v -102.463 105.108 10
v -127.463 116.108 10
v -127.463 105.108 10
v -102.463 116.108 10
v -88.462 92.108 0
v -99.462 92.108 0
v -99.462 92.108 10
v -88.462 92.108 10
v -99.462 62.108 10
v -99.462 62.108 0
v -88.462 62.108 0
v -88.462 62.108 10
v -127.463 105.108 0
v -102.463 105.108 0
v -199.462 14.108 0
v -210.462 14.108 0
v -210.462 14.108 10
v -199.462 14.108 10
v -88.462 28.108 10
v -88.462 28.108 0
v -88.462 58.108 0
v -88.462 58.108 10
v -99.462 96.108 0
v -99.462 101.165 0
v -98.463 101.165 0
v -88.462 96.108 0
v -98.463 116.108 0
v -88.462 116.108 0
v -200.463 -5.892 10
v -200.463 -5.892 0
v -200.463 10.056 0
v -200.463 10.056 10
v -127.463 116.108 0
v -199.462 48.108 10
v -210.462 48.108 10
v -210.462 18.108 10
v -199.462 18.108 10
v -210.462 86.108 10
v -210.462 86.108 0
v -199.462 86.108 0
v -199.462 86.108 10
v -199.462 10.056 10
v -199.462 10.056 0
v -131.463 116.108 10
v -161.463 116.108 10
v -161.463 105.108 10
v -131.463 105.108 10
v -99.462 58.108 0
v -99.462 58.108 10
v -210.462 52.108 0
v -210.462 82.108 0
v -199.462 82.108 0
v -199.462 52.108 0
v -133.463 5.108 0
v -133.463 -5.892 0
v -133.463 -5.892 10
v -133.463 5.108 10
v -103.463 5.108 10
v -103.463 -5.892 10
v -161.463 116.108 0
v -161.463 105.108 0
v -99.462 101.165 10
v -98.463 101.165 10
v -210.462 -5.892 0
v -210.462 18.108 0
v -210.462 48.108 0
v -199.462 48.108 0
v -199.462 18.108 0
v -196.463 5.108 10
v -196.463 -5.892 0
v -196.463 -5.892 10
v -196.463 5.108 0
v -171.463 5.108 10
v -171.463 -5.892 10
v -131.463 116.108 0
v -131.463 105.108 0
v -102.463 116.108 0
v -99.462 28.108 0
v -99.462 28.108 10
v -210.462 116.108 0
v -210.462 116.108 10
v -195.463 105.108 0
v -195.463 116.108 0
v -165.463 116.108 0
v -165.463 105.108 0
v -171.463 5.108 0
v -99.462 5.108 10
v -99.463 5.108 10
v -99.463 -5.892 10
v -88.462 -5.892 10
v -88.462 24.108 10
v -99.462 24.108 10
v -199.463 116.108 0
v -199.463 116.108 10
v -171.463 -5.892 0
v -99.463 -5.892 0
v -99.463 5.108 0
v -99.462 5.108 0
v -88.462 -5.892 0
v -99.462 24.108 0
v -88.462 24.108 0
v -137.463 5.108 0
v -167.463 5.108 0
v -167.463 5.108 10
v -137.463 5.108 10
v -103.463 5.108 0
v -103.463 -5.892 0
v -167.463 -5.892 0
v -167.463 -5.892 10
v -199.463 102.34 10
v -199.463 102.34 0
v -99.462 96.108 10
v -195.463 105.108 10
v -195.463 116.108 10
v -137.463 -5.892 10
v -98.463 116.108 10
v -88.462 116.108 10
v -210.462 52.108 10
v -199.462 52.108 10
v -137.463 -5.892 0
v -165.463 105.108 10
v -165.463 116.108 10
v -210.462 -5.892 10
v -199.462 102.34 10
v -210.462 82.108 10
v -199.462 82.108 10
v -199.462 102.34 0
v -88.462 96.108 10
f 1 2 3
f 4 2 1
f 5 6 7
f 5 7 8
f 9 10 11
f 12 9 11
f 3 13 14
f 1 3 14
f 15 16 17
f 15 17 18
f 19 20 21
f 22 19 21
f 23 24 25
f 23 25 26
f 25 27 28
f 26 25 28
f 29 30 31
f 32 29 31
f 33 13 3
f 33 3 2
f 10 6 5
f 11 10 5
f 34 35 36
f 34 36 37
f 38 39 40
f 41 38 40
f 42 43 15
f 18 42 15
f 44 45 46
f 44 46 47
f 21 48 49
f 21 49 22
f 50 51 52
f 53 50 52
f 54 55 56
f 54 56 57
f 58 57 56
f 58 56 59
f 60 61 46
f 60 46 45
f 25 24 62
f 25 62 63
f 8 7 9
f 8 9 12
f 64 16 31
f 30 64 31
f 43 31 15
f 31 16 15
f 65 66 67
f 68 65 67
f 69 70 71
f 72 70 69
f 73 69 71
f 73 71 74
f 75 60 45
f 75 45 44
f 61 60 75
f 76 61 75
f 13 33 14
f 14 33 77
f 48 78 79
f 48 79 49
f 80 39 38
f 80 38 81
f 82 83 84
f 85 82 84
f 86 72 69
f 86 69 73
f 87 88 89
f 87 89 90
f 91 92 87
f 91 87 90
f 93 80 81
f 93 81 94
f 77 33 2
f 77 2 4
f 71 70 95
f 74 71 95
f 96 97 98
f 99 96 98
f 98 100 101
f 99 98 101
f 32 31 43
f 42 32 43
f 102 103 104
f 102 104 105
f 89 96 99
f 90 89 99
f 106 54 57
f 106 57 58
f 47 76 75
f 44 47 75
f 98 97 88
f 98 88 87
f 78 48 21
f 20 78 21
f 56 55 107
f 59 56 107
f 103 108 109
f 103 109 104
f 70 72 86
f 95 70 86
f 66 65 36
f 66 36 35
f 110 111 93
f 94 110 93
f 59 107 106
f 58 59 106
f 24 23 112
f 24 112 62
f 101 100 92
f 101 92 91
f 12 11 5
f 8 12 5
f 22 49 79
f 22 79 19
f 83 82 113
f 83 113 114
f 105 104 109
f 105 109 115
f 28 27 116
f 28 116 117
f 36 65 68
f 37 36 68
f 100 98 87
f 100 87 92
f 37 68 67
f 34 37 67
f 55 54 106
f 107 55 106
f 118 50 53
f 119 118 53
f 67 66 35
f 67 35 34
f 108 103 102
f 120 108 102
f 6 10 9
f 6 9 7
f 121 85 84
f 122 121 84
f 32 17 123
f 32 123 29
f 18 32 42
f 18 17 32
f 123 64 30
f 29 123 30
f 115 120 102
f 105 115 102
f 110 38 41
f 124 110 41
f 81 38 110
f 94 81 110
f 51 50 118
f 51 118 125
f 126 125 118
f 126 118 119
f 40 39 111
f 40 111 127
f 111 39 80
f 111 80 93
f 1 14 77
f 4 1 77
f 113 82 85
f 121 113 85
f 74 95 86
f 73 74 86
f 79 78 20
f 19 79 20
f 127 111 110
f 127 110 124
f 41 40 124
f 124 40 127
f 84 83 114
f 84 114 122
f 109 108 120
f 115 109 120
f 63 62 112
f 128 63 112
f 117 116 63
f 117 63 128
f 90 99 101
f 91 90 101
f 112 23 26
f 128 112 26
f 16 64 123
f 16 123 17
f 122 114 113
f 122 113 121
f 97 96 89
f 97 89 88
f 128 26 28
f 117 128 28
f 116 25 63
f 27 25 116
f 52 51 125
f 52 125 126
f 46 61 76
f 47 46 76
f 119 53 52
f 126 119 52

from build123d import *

# Parameters (mm, degrees)
SKETCH6_W           = 122
SKETCH6_H           = 122
SKETCH6_W_2         = 100
SKETCH6_H_2         = 100
BOSS_EXTRUDE3_DEPTH = 10
SKETCH7_W           = 4
SKETCH7_H           = 13.767715449
CUT_EXTRUDE2_DEPTH  = 10
SKETCH8_W           = 4
SKETCH8_H           = 15
CUT_EXTRUDE3_DEPTH  = 10
SKETCH9_W           = 4
SKETCH9_H           = 18
CUT_EXTRUDE4_DEPTH  = 10
SKETCH10_W          = 4
SKETCH10_H          = 16.778786697
CUT_EXTRUDE5_DEPTH  = 10
SKETCH11_W          = 4
SKETCH11_H          = 17.459048521
CUT_EXTRUDE7_DEPTH  = 10
SKETCH12_W          = 4
SKETCH12_H          = 21.812422706
CUT_EXTRUDE9_DEPTH  = 10
SKETCH13_W          = 4
SKETCH13_H          = 17.574592677
CUT_EXTRUDE10_DEPTH = 10
SKETCH14_W          = 4
SKETCH14_H          = 21.309059105
CUT_EXTRUDE11_DEPTH = 10
SKETCH15_W          = 17.282150298
SKETCH15_H          = 4
CUT_EXTRUDE12_DEPTH = 10
SKETCH16_W          = 20.302331903
SKETCH16_H          = 4
CUT_EXTRUDE13_DEPTH = 10
SKETCH18_W          = 17.114362431
SKETCH18_H          = 4
CUT_EXTRUDE15_DEPTH = 10
SKETCH19_W          = 18.2888775
SKETCH19_H          = 4
CUT_EXTRUDE16_DEPTH = 10
SKETCH20_W          = 17.953301765
SKETCH20_H          = 4
CUT_EXTRUDE17_DEPTH = 10
SKETCH21_W          = 23.154725642
SKETCH21_H          = 4
CUT_EXTRUDE19_DEPTH = 10


with BuildPart() as part:
    # Sketch6 → Boss-Extrude3 (new body)
    with BuildSketch(Plane.XY):
        with Locations((-149.462365591, 55.107526882)):
            Rectangle(SKETCH6_W, SKETCH6_H)
        with Locations((-149.462365591, 55.107526882)):
            Rectangle(SKETCH6_W_2, SKETCH6_H_2, mode=Mode.SUBTRACT)
    extrude(amount=BOSS_EXTRUDE3_DEPTH)

    # Sketch7 → Cut-Extrude2 (cut)
    with BuildSketch(Plane.XY):
        with Locations((-197.463365591, 109.223669158)):
            Rectangle(SKETCH7_W, SKETCH7_H)
    extrude(amount=CUT_EXTRUDE2_DEPTH, mode=Mode.SUBTRACT)

    # Sketch8 → Cut-Extrude3 (cut)
    with BuildSketch(Plane.XY):
        with Locations((-163.463365591, 110.846538635)):
            Rectangle(SKETCH8_W, SKETCH8_H)
    extrude(amount=CUT_EXTRUDE3_DEPTH, mode=Mode.SUBTRACT)


with BuildPart() as cut_extrude3_piece_1:
    # of the separate pieces the step leaves, piece 1, a body of its own (cut_extrude3_pieces)
    add(part.part.solids().sort_by_distance((-210.462365591, 116.107526882, 0))[0])

    # Sketch9 → Cut-Extrude4 (cut)
    with BuildSketch(Plane.XY):
        with Locations((-129.463365591, 107.107526882)):
            Rectangle(SKETCH9_W, SKETCH9_H)
    extrude(amount=CUT_EXTRUDE4_DEPTH, mode=Mode.SUBTRACT)


with BuildPart() as cut_extrude3_piece_2:
    # of the separate pieces the step leaves, piece 2, a body of its own (cut_extrude3_pieces)
    add(part.part.solids().sort_by_distance((-195.463365591, 116.107526882, 0))[0])


with BuildPart() as cut_extrude4_piece_1:
    # of the separate pieces the step leaves, piece 1, a body of its own (cut_extrude4_pieces)
    add(cut_extrude3_piece_1.part.solids().sort_by_distance((-210.462365591, 116.107526882, 0))[0])

    # Sketch10 → Cut-Extrude5 (cut)
    with BuildSketch(Plane.XY):
        with Locations((-100.463365591, 109.554689714)):
            Rectangle(SKETCH10_W, SKETCH10_H)
    extrude(amount=CUT_EXTRUDE5_DEPTH, mode=Mode.SUBTRACT)


with BuildPart() as cut_extrude4_piece_2:
    # of the separate pieces the step leaves, piece 2, a body of its own (cut_extrude4_pieces)
    add(cut_extrude3_piece_1.part.solids().sort_by_distance((-161.463365591, 116.107526882, 0))[0])


with BuildPart() as cut_extrude5_piece_1:
    # of the separate pieces the step leaves, piece 1, a body of its own (cut_extrude5_pieces)
    add(cut_extrude4_piece_1.part.solids().sort_by_distance((-210.462365591, 116.107526882, 0))[0])

    # Sketch11 → Cut-Extrude7 (cut)
    with BuildSketch(Plane.XY):
        with Locations((-101.463365591, 2.837051142)):
            Rectangle(SKETCH11_W, SKETCH11_H)
    extrude(amount=CUT_EXTRUDE7_DEPTH, mode=Mode.SUBTRACT)


with BuildPart() as cut_extrude5_piece_2:
    # of the separate pieces the step leaves, piece 2, a body of its own (cut_extrude5_pieces)
    add(cut_extrude4_piece_1.part.solids().sort_by_distance((-127.463365591, 116.107526882, 0))[0])


with BuildPart() as cut_extrude7_piece_1:
    # of the separate pieces the step leaves, piece 1, a body of its own (cut_extrude7_pieces)
    add(cut_extrude5_piece_1.part.solids().sort_by_distance((-210.462365591, 116.107526882, 0))[0])

    # Sketch12 → Cut-Extrude9 (cut)
    with BuildSketch(Plane.XY):
        with Locations((-135.463365591, 0.492576183)):
            Rectangle(SKETCH12_W, SKETCH12_H)
    extrude(amount=CUT_EXTRUDE9_DEPTH, mode=Mode.SUBTRACT)


with BuildPart() as cut_extrude7_piece_2:
    # of the separate pieces the step leaves, piece 2, a body of its own (cut_extrude7_pieces)
    add(cut_extrude5_piece_1.part.solids().sort_by_distance((-98.463365591, 116.107526882, 0))[0])

    # Sketch19 → Cut-Extrude16 (cut)
    with BuildSketch(Plane.XY):
        with Locations((-92.619670477, 26.107526882)):
            Rectangle(SKETCH19_W, SKETCH19_H)
    extrude(amount=CUT_EXTRUDE16_DEPTH, mode=Mode.SUBTRACT)


with BuildPart() as cut_extrude9_piece_1:
    # of the separate pieces the step leaves, piece 1, a body of its own (cut_extrude9_pieces)
    add(cut_extrude7_piece_1.part.solids().sort_by_distance((-210.462365591, 116.107526882, 0))[0])

    # Sketch13 → Cut-Extrude10 (cut)
    with BuildSketch(Plane.XY):
        with Locations((-169.463365591, 0.297173693)):
            Rectangle(SKETCH13_W, SKETCH13_H)
    extrude(amount=CUT_EXTRUDE10_DEPTH, mode=Mode.SUBTRACT)


with BuildPart() as cut_extrude9_piece_2:
    # of the separate pieces the step leaves, piece 2, a body of its own (cut_extrude9_pieces)
    add(cut_extrude7_piece_1.part.solids().sort_by_distance((-103.463365591, -5.892473118, 0))[0])


with BuildPart() as cut_extrude10_piece_1:
    # of the separate pieces the step leaves, piece 1, a body of its own (cut_extrude10_pieces)
    add(cut_extrude9_piece_1.part.solids().sort_by_distance((-210.462365591, 116.107526882, 0))[0])

    # Sketch14 → Cut-Extrude11 (cut)
    with BuildSketch(Plane.XY):
        with Locations((-198.463365591, -0.598044951)):
            Rectangle(SKETCH14_W, SKETCH14_H)
    extrude(amount=CUT_EXTRUDE11_DEPTH, mode=Mode.SUBTRACT)


with BuildPart() as cut_extrude10_piece_2:
    # of the separate pieces the step leaves, piece 2, a body of its own (cut_extrude10_pieces)
    add(cut_extrude9_piece_1.part.solids().sort_by_distance((-137.463365591, -5.892473118, 0))[0])


with BuildPart() as cut_extrude11_piece_1:
    # of the separate pieces the step leaves, piece 1, a body of its own (cut_extrude11_pieces)
    add(cut_extrude10_piece_1.part.solids().sort_by_distance((-210.462365591, 116.107526882, 0))[0])

    # Sketch15 → Cut-Extrude12 (cut)
    with BuildSketch(Plane.XY):
        with Locations((-203.909528423, 84.107526882)):
            Rectangle(SKETCH15_W, SKETCH15_H)
    extrude(amount=CUT_EXTRUDE12_DEPTH, mode=Mode.SUBTRACT)


with BuildPart() as cut_extrude11_piece_2:
    # of the separate pieces the step leaves, piece 2, a body of its own (cut_extrude11_pieces)
    add(cut_extrude10_piece_1.part.solids().sort_by_distance((-171.463365591, -5.892473118, 0))[0])


with BuildPart() as cut_extrude12_piece_1:
    # of the separate pieces the step leaves, piece 1, a body of its own (cut_extrude12_pieces)
    add(cut_extrude11_piece_1.part.solids().sort_by_distance((-200.463365591, -5.892473118, 0))[0])

    # Sketch16 → Cut-Extrude13 (cut)
    with BuildSketch(Plane.XY):
        with Locations((-203.406164821, 50.107526882)):
            Rectangle(SKETCH16_W, SKETCH16_H)
    extrude(amount=CUT_EXTRUDE13_DEPTH, mode=Mode.SUBTRACT)


with BuildPart() as cut_extrude12_piece_2:
    # of the separate pieces the step leaves, piece 2, a body of its own (cut_extrude12_pieces)
    add(cut_extrude11_piece_1.part.solids().sort_by_distance((-210.462365591, 116.107526882, 0))[0])


with BuildPart() as cut_extrude13_piece_1:
    # of the separate pieces the step leaves, piece 1, a body of its own (cut_extrude13_pieces)
    add(cut_extrude12_piece_1.part.solids().sort_by_distance((-200.463365591, -5.892473118, 0))[0])

    # Sketch18 → Cut-Extrude15 (cut)
    with BuildSketch(Plane.XY):
        with Locations((-204.161210224, 16.107526882)):
            Rectangle(SKETCH18_W, SKETCH18_H)
    extrude(amount=CUT_EXTRUDE15_DEPTH, mode=Mode.SUBTRACT)


with BuildPart() as cut_extrude13_piece_2:
    # of the separate pieces the step leaves, piece 2, a body of its own (cut_extrude13_pieces)
    add(cut_extrude12_piece_1.part.solids().sort_by_distance((-210.462365591, 52.107526882, 0))[0])


with BuildPart() as cut_extrude15_piece_1:
    # of the separate pieces the step leaves, piece 1, a body of its own (cut_extrude15_pieces)
    add(cut_extrude13_piece_1.part.solids().sort_by_distance((-210.462365591, 18.107526882, 0))[0])


with BuildPart() as cut_extrude15_piece_2:
    # of the separate pieces the step leaves, piece 2, a body of its own (cut_extrude15_pieces)
    add(cut_extrude13_piece_1.part.solids().sort_by_distance((-200.463365591, -5.892473118, 0))[0])


with BuildPart() as cut_extrude16_piece_1:
    # of the separate pieces the step leaves, piece 1, a body of its own (cut_extrude16_pieces)
    add(cut_extrude7_piece_2.part.solids().sort_by_distance((-98.463365591, 116.107526882, 0))[0])

    # Sketch20 → Cut-Extrude17 (cut)
    with BuildSketch(Plane.XY):
        with Locations((-92.83396049, 60.107526882)):
            Rectangle(SKETCH20_W, SKETCH20_H)
    extrude(amount=CUT_EXTRUDE17_DEPTH, mode=Mode.SUBTRACT)


with BuildPart() as cut_extrude16_piece_2:
    # of the separate pieces the step leaves, piece 2, a body of its own (cut_extrude16_pieces)
    add(cut_extrude7_piece_2.part.solids().sort_by_distance((-88.462365591, 24.107526882, 0))[0])


with BuildPart() as cut_extrude17_piece_1:
    # of the separate pieces the step leaves, piece 1, a body of its own (cut_extrude17_pieces)
    add(cut_extrude16_piece_1.part.solids().sort_by_distance((-98.463365591, 116.107526882, 0))[0])

    # Sketch21 → Cut-Extrude19 (cut)
    with BuildSketch(Plane.XY):
        with Locations((-93.08564229, 94.107526882)):
            Rectangle(SKETCH21_W, SKETCH21_H)
    extrude(amount=CUT_EXTRUDE19_DEPTH, mode=Mode.SUBTRACT)


with BuildPart() as cut_extrude17_piece_2:
    # of the separate pieces the step leaves, piece 2, a body of its own (cut_extrude17_pieces)
    add(cut_extrude16_piece_1.part.solids().sort_by_distance((-88.462365591, 58.107526882, 0))[0])


with BuildPart() as cut_extrude19_piece_1:
    # of the separate pieces the step leaves, piece 1, a body of its own (cut_extrude19_pieces)
    add(cut_extrude17_piece_1.part.solids().sort_by_distance((-88.462365591, 92.107526882, 0))[0])


with BuildPart() as cut_extrude19_piece_2:
    # of the separate pieces the step leaves, piece 2, a body of its own (cut_extrude19_pieces)
    add(cut_extrude17_piece_1.part.solids().sort_by_distance((-98.463365591, 116.107526882, 0))[0])


solid = Compound([cut_extrude3_piece_2.part, cut_extrude4_piece_2.part, cut_extrude5_piece_2.part, cut_extrude9_piece_2.part, cut_extrude10_piece_2.part, cut_extrude11_piece_2.part, cut_extrude12_piece_2.part, cut_extrude13_piece_2.part, cut_extrude15_piece_1.part, cut_extrude15_piece_2.part, cut_extrude16_piece_2.part, cut_extrude17_piece_2.part, cut_extrude19_piece_1.part, cut_extrude19_piece_2.part])
